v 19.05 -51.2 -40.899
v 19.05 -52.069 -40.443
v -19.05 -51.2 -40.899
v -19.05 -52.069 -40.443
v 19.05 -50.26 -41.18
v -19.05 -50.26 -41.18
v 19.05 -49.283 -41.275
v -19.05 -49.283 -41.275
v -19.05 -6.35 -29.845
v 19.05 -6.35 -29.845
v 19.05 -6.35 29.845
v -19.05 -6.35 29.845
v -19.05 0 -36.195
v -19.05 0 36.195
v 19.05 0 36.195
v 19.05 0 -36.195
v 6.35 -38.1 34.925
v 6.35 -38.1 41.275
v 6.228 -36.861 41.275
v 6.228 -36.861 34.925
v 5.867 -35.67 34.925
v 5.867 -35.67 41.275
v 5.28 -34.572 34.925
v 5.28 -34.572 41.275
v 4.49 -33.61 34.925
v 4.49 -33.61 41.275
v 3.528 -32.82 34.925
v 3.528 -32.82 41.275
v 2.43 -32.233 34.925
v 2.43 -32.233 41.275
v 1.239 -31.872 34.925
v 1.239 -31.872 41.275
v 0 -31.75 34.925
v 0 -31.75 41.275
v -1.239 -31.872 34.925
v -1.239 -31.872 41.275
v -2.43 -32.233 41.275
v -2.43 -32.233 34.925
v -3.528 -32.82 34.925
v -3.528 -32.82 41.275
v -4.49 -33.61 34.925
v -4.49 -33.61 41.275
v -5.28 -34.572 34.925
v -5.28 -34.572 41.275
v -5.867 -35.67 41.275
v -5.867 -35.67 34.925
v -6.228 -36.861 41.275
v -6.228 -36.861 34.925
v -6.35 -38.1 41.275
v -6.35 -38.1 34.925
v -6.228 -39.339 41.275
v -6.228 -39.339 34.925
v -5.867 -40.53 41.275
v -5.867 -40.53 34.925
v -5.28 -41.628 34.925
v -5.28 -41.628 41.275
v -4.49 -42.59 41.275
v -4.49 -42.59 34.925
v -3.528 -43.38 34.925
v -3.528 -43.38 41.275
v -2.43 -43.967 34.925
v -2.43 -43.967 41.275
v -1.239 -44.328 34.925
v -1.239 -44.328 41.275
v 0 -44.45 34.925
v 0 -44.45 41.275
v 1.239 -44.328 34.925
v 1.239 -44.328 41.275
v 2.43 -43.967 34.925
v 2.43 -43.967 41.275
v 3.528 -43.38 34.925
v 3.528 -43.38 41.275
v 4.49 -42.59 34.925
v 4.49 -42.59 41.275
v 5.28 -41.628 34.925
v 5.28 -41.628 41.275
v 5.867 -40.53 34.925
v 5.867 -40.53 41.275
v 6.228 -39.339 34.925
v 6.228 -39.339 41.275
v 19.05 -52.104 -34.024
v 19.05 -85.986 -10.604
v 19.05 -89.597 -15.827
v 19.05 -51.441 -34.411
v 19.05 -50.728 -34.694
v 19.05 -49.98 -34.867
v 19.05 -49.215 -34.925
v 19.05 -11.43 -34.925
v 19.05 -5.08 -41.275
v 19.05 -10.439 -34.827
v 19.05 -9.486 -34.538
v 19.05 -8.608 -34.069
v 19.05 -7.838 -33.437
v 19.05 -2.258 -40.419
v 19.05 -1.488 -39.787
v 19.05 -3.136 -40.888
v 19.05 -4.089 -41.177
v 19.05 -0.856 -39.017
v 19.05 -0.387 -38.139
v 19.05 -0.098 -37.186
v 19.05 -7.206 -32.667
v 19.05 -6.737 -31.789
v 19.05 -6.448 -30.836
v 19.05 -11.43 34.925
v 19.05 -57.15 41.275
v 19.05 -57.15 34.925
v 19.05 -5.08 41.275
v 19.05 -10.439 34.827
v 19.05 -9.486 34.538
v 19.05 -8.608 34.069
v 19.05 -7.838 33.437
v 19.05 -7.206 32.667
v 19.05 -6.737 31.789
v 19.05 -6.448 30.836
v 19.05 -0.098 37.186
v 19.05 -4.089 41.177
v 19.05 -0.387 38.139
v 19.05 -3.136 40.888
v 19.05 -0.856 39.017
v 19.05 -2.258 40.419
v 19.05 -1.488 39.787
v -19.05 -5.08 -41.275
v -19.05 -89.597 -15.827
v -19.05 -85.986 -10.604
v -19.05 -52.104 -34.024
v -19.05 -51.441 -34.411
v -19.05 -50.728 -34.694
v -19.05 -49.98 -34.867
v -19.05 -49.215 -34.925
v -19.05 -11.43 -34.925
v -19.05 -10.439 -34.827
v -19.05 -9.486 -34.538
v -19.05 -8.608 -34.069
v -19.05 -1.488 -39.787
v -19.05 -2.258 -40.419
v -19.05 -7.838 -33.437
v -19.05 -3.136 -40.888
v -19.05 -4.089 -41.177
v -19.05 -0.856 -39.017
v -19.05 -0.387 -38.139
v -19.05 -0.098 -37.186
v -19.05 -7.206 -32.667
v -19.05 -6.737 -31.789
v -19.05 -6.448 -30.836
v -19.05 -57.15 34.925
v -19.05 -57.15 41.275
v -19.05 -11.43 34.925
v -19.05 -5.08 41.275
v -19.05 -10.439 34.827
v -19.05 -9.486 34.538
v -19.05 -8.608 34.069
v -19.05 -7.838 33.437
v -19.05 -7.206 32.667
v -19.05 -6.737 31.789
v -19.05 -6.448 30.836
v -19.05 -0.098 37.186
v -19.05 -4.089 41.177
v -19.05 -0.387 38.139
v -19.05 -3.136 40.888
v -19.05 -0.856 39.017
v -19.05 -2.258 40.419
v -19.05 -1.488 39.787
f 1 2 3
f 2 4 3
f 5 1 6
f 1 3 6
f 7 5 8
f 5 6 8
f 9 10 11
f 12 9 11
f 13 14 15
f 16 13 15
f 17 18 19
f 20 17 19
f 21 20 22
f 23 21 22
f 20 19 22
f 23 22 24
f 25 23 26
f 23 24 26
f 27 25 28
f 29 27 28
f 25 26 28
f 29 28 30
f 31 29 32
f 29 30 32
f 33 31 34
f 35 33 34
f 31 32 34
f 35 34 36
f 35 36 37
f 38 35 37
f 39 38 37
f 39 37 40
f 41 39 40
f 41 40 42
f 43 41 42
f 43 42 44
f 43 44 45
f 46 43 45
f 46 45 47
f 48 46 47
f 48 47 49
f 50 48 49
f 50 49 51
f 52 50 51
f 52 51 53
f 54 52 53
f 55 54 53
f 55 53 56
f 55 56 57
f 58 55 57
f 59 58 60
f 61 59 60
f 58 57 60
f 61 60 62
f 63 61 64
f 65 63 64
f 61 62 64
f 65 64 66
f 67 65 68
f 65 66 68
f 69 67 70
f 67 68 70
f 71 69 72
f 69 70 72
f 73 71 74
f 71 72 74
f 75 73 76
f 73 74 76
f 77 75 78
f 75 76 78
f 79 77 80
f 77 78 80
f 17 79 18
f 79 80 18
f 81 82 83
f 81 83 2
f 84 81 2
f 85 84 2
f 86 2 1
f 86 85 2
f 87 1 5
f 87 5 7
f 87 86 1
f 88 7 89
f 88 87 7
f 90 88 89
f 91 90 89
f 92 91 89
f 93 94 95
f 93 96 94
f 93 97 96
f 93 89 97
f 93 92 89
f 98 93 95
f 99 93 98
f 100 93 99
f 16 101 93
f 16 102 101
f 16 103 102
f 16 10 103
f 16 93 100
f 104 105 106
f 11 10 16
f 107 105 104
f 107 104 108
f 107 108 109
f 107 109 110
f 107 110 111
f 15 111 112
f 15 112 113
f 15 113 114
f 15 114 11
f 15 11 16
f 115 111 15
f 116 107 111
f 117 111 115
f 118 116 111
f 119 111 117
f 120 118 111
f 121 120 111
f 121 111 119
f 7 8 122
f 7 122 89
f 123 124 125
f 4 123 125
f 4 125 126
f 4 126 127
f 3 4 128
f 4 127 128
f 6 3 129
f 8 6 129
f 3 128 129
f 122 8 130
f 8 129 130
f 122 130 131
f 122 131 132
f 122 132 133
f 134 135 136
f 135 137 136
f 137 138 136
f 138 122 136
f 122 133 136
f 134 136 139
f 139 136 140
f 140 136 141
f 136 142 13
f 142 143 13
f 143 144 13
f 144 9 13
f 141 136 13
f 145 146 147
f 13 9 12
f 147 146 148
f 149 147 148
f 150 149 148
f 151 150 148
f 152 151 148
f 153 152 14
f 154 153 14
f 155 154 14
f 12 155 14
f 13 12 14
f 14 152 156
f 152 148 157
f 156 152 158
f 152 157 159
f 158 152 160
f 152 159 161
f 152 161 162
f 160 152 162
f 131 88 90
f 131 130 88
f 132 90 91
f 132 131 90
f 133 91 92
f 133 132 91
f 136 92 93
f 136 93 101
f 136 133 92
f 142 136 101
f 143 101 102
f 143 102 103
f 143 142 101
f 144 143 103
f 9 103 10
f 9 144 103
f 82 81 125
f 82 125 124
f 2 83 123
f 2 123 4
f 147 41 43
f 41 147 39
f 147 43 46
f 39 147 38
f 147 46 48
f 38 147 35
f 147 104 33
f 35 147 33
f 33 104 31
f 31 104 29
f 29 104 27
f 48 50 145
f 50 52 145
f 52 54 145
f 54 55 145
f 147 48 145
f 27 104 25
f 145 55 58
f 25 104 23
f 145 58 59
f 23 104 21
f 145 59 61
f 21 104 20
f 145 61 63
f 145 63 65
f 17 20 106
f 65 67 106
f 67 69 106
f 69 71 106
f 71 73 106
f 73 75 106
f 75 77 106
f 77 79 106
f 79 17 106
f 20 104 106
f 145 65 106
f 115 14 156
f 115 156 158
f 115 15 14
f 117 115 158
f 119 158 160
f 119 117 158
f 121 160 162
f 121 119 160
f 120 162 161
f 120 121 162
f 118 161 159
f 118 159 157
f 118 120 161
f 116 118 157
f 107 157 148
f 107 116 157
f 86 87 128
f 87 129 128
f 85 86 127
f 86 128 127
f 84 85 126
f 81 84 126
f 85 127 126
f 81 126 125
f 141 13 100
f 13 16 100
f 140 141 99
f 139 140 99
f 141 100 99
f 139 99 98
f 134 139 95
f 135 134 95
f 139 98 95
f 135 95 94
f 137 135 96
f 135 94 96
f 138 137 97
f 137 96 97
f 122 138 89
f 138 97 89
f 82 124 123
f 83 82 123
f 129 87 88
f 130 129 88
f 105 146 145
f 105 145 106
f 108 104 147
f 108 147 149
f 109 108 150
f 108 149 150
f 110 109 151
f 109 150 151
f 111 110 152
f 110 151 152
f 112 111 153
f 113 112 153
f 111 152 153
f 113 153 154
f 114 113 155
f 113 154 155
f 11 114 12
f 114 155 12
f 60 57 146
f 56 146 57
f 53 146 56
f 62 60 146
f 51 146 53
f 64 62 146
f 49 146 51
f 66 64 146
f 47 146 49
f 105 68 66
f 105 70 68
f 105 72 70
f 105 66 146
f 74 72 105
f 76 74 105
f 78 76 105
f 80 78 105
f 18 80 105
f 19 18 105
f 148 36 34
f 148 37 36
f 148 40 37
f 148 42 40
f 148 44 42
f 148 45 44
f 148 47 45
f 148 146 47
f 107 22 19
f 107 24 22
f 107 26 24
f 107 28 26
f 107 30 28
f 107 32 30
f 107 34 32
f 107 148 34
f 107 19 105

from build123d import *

# Parameters (mm, degrees)
F0_W      = 38.1
F0_H      = 82.55
F1_DEPTH  = 57.15
F3_DEPTH  = 48.006
F5_DEPTH  = 38.1
F6_R      = 5.08
F7_R      = 5.08
F8_R      = 5.08
F9_R      = 5.08
F10_R     = 5.08
F11_R     = 6.35
F12_DEPTH = 25.4


with BuildPart() as f1:
    # F0 (on Front) → F1 (new body)
    with BuildSketch(Plane.XZ):
        Rectangle(F0_W, F0_H)
    extrude(amount=F1_DEPTH)

    # F2 (on face) → F3 (cut)
    with BuildSketch(Plane.YZ.offset(19.05)):
        Polygon((-6.35, 34.925), (-57.15, 34.925), (-57.15, -41.275), (-50.8, -41.275), (-50.8, -34.925), (-6.35, -34.925), align=None)
    extrude(amount=-F3_DEPTH, mode=Mode.SUBTRACT)

    # F4 (on face) → F5 (join)
    with BuildSketch(Plane.YZ.offset(19.05)):
        Polygon((-50.8, -41.275), (-50.8, -34.925), (-85.9860533047, -10.6037642213), (-89.5966880699, -15.8273469566), align=None)
    extrude(amount=-F5_DEPTH)

    # F6
    f6_edges = [f1.edges().sort_by_distance(p)[0] for p in [
        (0, 0, 41.275),
    ]]
    fillet(f6_edges, radius=F6_R)

    # F7
    f7_edges = [f1.edges().sort_by_distance(p)[0] for p in [
        (0, -6.35, 34.925),
    ]]
    fillet(f7_edges, radius=F7_R)

    # F8
    f8_edges = [f1.edges().sort_by_distance(p)[0] for p in [
        (0, 0, -41.275),
    ]]
    fillet(f8_edges, radius=F8_R)

    # F9
    f9_edges = [f1.edges().sort_by_distance(p)[0] for p in [
        (0, -6.35, -34.925),
    ]]
    fillet(f9_edges, radius=F9_R)

    # F10
    f10_edges = [f1.edges().sort_by_distance(p)[0] for p in [
        (0, -50.8, -34.925),
        (0, -50.8, -41.275),
    ]]
    fillet(f10_edges, radius=F10_R)

    # F11 (on face) → F12 (cut)
    with BuildSketch(Plane.XY.offset(41.275)):
        with Locations((0, -38.1)):
            Circle(F11_R)
    extrude(amount=-F12_DEPTH, mode=Mode.SUBTRACT)


solid = f1.part
